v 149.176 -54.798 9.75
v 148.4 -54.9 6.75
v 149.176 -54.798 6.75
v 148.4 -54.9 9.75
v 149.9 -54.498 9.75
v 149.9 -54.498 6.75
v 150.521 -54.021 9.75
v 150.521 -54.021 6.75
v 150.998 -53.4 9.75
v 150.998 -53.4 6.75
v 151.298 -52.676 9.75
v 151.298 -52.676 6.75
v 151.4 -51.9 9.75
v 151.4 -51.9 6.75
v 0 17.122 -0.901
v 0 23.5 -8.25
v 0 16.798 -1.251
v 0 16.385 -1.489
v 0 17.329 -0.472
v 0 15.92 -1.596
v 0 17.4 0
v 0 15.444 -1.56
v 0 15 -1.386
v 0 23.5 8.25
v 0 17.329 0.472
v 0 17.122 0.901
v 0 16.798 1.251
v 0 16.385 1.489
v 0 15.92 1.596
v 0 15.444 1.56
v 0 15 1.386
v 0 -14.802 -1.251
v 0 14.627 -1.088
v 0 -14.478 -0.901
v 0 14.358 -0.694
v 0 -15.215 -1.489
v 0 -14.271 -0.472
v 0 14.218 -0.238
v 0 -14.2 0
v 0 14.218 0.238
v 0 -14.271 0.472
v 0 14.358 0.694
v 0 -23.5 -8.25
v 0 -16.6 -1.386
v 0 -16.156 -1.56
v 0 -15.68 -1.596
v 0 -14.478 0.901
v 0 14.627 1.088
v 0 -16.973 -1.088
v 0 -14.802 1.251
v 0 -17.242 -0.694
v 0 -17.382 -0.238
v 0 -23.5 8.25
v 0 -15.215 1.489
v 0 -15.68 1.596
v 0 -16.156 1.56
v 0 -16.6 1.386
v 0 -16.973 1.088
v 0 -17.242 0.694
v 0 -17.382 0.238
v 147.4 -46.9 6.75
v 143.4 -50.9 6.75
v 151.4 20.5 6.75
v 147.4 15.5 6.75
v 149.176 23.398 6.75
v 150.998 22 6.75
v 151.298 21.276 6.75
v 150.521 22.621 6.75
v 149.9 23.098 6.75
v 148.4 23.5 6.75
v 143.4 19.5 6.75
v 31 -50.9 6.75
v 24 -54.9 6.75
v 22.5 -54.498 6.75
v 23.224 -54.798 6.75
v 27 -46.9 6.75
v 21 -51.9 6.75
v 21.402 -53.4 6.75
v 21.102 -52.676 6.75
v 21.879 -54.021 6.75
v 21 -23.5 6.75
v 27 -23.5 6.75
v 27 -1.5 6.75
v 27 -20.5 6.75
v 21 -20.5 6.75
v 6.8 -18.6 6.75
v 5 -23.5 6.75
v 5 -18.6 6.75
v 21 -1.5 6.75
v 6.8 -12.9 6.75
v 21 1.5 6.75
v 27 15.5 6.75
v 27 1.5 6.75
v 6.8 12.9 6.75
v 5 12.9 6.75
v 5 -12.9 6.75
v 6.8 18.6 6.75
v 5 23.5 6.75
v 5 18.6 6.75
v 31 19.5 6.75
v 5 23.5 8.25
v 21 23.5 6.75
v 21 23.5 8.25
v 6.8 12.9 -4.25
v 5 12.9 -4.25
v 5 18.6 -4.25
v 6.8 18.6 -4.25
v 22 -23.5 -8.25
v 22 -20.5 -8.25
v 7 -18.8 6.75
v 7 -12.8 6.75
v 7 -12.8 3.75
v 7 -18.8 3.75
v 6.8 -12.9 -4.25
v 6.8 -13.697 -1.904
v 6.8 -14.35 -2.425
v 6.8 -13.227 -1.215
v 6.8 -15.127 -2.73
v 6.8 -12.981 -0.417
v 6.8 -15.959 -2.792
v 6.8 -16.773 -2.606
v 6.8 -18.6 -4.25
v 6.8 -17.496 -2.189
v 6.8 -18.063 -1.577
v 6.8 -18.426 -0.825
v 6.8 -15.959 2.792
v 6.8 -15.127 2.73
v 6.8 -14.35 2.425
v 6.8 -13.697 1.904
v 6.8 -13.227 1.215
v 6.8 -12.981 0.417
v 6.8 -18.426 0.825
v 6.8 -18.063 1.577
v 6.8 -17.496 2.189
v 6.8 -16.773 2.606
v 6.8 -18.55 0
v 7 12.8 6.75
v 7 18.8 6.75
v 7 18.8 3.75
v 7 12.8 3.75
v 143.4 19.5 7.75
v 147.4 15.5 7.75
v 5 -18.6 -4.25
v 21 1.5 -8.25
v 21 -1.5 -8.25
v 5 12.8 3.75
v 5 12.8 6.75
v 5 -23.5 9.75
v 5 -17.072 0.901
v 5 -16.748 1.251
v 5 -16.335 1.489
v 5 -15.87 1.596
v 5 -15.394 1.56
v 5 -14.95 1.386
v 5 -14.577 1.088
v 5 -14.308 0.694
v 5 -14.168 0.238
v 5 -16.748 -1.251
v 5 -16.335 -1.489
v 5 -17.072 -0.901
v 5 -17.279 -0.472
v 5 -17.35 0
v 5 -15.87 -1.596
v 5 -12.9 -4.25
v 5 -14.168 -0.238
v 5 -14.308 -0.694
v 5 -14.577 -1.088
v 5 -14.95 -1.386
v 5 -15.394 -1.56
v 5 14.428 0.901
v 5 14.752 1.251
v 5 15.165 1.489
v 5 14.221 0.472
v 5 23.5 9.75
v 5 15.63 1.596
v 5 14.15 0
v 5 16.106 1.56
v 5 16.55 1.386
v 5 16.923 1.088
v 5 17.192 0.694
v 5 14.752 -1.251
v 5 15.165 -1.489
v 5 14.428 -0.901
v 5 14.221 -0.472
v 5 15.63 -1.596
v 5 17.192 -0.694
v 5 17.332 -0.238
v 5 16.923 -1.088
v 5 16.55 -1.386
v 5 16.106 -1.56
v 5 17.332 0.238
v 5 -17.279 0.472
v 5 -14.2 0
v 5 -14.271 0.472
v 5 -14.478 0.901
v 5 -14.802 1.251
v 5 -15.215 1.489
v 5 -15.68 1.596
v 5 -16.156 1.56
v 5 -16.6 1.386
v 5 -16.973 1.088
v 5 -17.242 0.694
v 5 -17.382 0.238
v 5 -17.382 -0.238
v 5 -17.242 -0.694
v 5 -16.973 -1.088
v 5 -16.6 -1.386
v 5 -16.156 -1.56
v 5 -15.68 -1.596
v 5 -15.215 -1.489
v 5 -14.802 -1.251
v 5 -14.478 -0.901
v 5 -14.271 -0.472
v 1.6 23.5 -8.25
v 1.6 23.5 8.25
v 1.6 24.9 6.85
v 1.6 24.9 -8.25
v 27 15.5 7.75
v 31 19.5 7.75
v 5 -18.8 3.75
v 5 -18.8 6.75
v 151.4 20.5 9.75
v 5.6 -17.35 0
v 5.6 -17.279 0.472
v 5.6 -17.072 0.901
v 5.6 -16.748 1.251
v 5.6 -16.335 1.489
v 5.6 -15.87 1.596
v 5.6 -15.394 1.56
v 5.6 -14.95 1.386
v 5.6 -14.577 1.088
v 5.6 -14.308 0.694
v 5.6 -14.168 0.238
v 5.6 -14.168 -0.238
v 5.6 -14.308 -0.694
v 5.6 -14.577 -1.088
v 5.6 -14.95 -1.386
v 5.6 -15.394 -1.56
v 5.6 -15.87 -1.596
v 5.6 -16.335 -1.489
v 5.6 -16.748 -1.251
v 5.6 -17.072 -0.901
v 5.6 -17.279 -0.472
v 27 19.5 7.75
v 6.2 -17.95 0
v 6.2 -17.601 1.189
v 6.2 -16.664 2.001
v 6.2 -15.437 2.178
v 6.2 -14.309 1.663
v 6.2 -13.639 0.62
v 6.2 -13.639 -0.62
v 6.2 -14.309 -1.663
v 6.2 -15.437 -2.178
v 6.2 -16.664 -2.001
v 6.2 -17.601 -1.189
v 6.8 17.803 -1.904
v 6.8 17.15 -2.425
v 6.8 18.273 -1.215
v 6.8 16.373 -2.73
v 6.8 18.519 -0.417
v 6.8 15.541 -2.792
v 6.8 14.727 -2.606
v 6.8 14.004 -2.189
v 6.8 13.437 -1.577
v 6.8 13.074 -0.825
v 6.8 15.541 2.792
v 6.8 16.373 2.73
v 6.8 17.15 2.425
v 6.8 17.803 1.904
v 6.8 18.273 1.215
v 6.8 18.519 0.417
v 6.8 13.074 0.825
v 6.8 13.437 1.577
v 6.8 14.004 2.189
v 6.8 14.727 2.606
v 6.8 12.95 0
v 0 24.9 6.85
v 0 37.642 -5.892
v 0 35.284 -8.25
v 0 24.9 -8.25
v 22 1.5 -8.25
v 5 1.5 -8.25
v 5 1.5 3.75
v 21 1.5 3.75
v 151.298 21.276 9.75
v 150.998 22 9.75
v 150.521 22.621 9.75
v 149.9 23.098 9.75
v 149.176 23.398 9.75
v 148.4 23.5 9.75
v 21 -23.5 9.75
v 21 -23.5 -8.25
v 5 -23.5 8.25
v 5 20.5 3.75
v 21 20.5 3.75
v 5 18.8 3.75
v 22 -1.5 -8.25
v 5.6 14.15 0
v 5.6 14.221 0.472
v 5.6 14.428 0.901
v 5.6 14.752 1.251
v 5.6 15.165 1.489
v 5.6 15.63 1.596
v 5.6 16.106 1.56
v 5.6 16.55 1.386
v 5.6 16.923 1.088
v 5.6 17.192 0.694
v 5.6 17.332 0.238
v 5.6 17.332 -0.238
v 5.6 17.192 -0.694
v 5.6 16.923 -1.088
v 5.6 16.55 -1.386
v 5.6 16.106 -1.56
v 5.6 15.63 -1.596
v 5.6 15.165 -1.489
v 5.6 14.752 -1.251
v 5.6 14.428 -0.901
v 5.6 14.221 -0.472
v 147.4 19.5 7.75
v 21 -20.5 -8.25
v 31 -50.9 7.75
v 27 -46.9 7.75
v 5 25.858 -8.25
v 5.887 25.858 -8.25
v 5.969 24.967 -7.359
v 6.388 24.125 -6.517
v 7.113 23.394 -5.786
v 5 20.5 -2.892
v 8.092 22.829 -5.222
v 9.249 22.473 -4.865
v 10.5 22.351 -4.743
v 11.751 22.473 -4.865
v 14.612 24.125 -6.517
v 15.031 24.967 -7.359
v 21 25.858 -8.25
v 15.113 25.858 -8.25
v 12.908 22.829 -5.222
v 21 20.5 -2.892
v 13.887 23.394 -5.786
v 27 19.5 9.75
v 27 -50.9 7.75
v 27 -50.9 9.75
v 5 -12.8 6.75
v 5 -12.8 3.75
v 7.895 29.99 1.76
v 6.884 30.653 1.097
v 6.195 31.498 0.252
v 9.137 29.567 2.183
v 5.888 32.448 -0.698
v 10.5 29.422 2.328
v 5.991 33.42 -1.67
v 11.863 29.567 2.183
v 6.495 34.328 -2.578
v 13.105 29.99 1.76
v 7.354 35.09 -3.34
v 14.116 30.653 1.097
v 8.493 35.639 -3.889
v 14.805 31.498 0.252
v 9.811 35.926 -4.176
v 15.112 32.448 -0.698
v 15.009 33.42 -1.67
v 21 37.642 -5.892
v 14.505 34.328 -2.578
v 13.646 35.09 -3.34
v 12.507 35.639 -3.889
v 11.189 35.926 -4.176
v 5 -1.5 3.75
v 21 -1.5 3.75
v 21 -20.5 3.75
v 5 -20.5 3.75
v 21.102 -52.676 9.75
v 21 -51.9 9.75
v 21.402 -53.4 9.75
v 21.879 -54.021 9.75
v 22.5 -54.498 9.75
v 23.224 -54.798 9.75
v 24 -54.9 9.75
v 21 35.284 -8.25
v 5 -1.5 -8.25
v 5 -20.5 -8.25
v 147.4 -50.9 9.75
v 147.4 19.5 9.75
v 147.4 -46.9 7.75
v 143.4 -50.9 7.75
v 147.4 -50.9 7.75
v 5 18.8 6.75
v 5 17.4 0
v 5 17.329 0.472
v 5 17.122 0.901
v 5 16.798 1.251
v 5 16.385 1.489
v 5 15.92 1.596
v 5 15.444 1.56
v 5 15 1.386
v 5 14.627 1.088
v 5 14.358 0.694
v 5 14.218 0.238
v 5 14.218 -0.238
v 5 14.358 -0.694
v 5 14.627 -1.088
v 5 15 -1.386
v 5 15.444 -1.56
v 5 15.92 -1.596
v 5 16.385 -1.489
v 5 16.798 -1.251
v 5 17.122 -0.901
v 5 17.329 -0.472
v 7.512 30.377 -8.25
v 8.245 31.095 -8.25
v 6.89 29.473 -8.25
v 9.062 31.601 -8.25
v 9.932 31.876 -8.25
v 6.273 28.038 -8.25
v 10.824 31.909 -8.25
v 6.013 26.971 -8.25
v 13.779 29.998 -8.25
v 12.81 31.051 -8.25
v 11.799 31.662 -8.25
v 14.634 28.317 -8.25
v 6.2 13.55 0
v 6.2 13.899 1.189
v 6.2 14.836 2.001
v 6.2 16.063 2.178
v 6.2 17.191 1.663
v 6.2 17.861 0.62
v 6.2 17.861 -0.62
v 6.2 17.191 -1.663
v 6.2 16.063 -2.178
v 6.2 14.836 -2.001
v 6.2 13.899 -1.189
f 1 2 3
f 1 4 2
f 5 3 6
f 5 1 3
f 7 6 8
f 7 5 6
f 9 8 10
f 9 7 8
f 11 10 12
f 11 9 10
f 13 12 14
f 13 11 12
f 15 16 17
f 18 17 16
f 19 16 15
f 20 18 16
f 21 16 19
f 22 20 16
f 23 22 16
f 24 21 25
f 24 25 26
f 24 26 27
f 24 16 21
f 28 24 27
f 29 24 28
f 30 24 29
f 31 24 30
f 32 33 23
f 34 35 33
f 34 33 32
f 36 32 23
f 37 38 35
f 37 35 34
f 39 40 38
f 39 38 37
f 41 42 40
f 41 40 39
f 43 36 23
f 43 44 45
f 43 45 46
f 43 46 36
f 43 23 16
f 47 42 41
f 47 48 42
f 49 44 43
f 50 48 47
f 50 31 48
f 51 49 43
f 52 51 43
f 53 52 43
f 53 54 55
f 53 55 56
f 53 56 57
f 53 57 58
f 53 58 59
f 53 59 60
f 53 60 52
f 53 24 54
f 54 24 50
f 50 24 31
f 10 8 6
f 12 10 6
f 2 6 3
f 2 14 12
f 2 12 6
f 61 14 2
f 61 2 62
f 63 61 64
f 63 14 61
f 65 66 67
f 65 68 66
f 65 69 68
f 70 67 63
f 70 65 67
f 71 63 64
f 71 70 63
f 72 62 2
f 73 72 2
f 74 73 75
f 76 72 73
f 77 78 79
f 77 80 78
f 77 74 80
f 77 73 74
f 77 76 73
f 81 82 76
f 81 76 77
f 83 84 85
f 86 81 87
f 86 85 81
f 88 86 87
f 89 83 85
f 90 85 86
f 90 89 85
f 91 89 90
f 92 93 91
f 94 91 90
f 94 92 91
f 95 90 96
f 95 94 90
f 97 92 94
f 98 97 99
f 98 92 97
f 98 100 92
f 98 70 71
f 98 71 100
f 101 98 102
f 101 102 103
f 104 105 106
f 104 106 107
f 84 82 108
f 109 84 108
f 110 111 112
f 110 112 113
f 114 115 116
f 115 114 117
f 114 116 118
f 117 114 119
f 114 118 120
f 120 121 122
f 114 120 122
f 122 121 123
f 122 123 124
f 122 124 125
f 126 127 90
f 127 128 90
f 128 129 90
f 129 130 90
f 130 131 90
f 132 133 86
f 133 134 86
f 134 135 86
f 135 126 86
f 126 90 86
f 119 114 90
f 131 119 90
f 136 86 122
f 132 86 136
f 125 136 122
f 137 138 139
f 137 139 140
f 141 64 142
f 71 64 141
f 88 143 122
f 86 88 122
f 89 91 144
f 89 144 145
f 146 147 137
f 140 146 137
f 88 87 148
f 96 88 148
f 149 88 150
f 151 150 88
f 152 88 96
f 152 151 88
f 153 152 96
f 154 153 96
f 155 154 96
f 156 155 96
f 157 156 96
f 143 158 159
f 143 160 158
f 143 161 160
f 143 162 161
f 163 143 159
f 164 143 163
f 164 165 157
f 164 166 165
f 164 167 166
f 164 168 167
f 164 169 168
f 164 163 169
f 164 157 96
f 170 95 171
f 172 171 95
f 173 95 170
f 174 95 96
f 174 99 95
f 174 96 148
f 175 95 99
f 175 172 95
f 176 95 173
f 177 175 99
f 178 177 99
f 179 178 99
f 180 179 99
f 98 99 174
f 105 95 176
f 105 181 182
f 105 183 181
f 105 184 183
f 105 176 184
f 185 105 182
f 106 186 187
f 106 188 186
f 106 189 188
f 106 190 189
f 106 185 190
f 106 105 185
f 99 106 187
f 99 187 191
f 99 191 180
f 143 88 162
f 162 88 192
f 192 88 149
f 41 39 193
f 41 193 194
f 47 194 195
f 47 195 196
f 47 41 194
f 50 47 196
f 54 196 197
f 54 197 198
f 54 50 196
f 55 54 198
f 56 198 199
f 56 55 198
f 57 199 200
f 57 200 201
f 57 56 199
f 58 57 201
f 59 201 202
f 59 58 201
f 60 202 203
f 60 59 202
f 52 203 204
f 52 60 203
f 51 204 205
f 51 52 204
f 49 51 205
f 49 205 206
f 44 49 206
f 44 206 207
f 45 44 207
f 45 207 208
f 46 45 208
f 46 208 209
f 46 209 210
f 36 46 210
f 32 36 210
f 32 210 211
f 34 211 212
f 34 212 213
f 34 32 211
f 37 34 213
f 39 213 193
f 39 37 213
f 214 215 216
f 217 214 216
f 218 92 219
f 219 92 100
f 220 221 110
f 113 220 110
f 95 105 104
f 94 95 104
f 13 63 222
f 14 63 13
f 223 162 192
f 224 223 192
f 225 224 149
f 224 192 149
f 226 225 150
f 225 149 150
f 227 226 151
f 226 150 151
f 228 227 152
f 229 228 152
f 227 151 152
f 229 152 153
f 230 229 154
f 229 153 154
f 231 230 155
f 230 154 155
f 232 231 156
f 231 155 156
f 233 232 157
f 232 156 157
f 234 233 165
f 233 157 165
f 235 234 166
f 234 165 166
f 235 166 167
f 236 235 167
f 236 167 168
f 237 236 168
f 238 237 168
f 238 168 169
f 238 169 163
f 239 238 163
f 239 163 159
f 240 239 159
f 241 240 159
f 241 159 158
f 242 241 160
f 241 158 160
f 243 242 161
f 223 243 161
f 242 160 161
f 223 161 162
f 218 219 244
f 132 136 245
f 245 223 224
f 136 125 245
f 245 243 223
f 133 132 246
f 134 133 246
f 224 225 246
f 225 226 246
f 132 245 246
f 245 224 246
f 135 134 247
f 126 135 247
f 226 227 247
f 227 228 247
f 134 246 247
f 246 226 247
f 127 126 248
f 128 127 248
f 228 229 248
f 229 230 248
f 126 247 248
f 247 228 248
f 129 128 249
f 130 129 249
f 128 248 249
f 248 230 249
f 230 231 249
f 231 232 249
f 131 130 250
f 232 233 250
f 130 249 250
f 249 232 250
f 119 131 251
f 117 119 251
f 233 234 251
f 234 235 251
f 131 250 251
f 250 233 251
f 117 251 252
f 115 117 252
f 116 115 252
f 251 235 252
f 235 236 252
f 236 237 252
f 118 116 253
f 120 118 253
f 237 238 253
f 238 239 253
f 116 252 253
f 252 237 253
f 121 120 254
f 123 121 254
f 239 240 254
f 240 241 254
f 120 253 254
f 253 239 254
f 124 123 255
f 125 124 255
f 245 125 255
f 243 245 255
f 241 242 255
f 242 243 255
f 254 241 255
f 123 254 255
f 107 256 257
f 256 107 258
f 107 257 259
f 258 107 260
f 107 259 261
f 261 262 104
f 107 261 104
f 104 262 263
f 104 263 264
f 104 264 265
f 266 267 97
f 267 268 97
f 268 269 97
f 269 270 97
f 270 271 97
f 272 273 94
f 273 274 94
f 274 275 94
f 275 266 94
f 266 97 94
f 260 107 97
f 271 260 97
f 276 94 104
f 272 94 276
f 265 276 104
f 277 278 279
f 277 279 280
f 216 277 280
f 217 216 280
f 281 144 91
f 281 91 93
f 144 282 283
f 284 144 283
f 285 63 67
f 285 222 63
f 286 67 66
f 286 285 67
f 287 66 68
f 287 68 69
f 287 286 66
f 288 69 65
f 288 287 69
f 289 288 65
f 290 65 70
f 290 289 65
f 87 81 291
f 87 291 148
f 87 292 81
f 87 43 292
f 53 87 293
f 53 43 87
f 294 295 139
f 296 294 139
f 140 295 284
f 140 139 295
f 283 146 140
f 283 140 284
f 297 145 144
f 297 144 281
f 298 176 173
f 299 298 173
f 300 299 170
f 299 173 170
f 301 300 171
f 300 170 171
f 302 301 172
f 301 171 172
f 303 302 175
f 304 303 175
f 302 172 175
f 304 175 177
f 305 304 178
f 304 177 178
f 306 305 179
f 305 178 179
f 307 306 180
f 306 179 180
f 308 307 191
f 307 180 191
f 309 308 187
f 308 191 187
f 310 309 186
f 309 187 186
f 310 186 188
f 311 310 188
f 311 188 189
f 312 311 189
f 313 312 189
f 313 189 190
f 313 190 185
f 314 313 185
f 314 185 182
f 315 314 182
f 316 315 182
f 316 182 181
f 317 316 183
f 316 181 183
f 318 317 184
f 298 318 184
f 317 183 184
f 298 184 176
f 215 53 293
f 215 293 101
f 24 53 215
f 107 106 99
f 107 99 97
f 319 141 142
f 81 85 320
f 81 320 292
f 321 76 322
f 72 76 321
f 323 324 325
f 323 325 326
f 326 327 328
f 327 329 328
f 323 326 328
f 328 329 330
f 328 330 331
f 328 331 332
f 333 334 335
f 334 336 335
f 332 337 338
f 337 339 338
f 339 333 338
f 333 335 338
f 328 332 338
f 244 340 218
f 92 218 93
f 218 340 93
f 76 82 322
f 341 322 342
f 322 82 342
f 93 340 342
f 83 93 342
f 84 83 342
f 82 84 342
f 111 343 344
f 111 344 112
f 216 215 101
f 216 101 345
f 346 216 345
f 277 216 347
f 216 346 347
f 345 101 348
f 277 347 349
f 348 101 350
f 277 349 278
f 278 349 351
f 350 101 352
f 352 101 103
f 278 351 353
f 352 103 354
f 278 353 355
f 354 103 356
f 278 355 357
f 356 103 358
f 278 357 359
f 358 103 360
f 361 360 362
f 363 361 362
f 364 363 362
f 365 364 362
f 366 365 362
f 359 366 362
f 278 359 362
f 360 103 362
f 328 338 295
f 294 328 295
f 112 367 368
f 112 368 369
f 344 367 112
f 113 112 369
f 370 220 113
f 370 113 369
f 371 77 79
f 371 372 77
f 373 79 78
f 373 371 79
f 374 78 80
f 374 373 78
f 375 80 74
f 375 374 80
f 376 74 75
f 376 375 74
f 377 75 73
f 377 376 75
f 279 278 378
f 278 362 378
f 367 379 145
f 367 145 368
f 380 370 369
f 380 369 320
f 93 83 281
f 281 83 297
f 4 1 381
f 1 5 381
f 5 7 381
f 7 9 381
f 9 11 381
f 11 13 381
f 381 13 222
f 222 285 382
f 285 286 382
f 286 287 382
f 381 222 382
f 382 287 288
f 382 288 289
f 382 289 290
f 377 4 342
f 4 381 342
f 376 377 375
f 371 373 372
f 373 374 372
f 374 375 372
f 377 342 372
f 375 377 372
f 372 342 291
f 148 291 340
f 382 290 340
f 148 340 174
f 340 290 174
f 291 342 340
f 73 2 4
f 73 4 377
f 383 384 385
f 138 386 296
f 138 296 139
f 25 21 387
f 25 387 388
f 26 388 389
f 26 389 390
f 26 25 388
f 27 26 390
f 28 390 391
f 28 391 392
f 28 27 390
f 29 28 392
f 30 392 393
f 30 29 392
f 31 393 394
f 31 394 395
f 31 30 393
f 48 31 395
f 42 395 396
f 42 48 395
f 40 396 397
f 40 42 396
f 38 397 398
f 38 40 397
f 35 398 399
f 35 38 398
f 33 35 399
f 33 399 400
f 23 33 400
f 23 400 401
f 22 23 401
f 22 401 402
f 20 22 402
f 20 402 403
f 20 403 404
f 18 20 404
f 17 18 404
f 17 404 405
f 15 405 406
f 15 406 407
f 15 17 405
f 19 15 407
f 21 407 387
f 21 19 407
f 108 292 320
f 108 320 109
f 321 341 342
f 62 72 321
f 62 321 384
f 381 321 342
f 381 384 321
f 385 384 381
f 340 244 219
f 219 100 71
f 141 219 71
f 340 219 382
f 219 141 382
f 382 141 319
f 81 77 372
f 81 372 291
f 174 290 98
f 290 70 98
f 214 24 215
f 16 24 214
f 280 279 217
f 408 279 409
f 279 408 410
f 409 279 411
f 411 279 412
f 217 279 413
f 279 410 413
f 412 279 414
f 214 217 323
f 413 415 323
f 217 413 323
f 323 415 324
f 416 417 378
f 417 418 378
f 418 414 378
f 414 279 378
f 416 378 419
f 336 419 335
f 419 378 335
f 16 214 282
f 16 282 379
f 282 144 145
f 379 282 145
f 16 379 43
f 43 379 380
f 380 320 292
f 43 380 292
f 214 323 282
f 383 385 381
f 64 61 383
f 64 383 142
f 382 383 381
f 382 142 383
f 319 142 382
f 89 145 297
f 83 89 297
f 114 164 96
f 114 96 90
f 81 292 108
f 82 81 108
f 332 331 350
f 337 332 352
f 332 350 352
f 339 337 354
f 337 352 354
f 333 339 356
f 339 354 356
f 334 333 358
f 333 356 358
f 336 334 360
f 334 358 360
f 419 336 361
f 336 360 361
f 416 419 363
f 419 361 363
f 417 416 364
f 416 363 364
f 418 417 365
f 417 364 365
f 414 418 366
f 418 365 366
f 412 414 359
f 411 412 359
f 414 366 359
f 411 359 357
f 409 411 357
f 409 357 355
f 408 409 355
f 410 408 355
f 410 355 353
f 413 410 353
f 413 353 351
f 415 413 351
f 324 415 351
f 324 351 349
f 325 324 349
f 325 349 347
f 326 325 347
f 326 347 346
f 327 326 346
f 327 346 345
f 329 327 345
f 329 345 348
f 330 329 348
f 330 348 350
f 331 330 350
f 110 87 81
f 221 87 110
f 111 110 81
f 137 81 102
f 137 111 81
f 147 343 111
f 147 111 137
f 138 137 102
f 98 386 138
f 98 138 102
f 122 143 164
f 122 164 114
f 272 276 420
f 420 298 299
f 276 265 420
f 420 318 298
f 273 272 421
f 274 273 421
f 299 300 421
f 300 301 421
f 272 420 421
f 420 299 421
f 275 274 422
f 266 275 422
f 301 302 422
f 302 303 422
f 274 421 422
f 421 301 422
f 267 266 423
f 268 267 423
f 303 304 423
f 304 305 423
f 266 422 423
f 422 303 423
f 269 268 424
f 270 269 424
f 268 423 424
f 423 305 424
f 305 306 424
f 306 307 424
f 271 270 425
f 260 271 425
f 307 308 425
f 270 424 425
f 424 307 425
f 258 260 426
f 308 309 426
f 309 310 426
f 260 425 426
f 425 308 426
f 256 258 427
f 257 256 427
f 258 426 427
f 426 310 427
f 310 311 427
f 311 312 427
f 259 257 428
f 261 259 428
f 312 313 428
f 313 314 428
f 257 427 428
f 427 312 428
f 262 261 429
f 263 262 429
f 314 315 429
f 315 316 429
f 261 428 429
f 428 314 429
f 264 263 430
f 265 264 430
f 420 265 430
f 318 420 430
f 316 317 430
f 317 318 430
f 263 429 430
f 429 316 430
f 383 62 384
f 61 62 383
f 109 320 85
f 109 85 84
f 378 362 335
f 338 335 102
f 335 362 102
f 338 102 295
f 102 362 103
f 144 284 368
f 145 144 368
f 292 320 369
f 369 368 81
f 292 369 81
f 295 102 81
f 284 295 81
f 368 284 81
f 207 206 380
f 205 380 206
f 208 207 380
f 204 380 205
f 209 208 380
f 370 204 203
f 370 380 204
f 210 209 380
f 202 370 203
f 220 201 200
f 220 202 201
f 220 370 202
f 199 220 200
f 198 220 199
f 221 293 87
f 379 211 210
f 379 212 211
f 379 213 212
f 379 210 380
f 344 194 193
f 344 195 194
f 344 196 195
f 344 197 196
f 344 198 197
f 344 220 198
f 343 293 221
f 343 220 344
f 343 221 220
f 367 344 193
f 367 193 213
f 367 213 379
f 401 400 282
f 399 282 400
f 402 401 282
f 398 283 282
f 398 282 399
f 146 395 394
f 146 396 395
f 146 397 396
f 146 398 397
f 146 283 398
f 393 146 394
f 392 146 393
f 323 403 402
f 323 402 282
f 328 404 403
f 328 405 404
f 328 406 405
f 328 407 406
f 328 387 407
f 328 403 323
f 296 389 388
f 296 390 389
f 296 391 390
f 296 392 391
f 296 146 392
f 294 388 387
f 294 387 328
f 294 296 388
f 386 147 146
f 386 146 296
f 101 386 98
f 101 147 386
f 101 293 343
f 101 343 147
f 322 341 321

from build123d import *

# Parameters (mm, degrees)
SKETCH_W          = 47
SKETCH_H          = 16.5
SKETCH_R          = 1.6
PAD_DEPTH         = 5
PAD001_DEPTH      = 16
SKETCH002_W       = 6
SKETCH002_H       = 2
POCKET_DEPTH      = 3
PAD002_DEPTH      = 16
PAD002_DEPTH_BACK = 5
SKETCH004_R       = 4.625
POCKET001_DEPTH   = 44.902281
POCKET002_DEPTH   = 16
SKETCH006_W       = 3
SKETCH006_H       = 12
PAD003_DEPTH      = 16
SKETCH008_W       = 1.4
SKETCH008_H       = 16.5
POCKET003_DEPTH   = 1.6
SKETCH007_W       = 120.4
SKETCH007_H       = 70.4
PAD004_DEPTH      = 3
SKETCH009_W       = 6
SKETCH009_H       = 3
PAD005_DEPTH      = 15
POCKET004_DEPTH   = 47.001
PAD006_DEPTH      = 1
SKETCH012_W       = 1.8
SKETCH012_H       = 5.7
PAD007_DEPTH      = 11
SKETCH013_R       = 1.6
POCKET005_DEPTH   = 1.8
FILLET_R          = 3
CHAMFER_SIZE      = 1.2


with BuildPart() as lens_and_arm_mount:
    # Sketch → Pad (new body)
    with BuildSketch(Plane.YZ):
        Rectangle(SKETCH_W, SKETCH_H)
        with Locations((-15.8, 0)):
            Circle(SKETCH_R, mode=Mode.SUBTRACT)
        with Locations((15.8, 0)):
            Circle(SKETCH_R, mode=Mode.SUBTRACT)
    extrude(amount=PAD_DEPTH)

    # Sketch001 (on Face8 of Pad) → Pad001 (join)
    with BuildSketch(Plane.YZ.offset(5)):
        Polygon((-23.5, -8.25), (-23.5, 6.75), (23.5, 6.75), (23.5, -8.25), (20.5, -8.25), (20.5, 3.75), (-20.5, 3.75), (-20.5, -8.25), align=None)
    extrude(amount=PAD001_DEPTH)

    # Sketch002 (on Face11 of Pad001) → Pocket (cut)
    with BuildSketch(Plane(origin=(0, 0, 6.75), x_dir=(0, -1, 0), z_dir=(0, 0, 1))):
        with Locations((-15.8, 6)):
            Rectangle(SKETCH002_W, SKETCH002_H)
        with Locations((15.8, 6)):
            Rectangle(SKETCH002_W, SKETCH002_H)
    extrude(amount=-POCKET_DEPTH, mode=Mode.SUBTRACT)

    # Sketch003 (on Face8 of Pad) → Pad002 (join, two sides)
    with BuildSketch(Plane.YZ.offset(5)) as pad002_sk:
        Polygon((23.5, 8.25), (37.642136, -5.892136), (35.284271, -8.25), (23.5, -8.25), align=None)
    extrude(amount=PAD002_DEPTH)
    extrude(pad002_sk.sketch, amount=-PAD002_DEPTH_BACK)

    # Sketch004 (on Face3 of Pad002) → Pocket001 (cut, through all)
    with BuildSketch(Plane(origin=(0, 15.875, 15.875), x_dir=(0, -0.707107, 0.707107), z_dir=(0, 0.707107, 0.707107))):
        with Locations((-23.783378, 10.5)):
            Circle(SKETCH004_R)
    extrude(amount=-POCKET001_DEPTH, mode=Mode.SUBTRACT)

    # Sketch005 (on Face11 of Pocket001) → Pocket002 (cut)
    with BuildSketch(Plane.YZ.offset(21)):
        Polygon((30.571068, -12.963203), (18.550253, -0.942388), (15.014719, -4.477922), (27.035534, -16.498737), align=None)
    extrude(amount=-POCKET002_DEPTH, mode=Mode.SUBTRACT)

    # Sketch006 (on Face15 of Pocket) → Pad003 (join)
    with BuildSketch(Plane.YZ.offset(5)):
        with Locations((0, -2.25)):
            Rectangle(SKETCH006_W, SKETCH006_H)
    extrude(amount=PAD003_DEPTH)

    # Sketch008 (on Face4 of Pocket001) → Pocket003 (cut)
    with BuildSketch(Plane(origin=(0, 0, 0), x_dir=(0, 1, 0), z_dir=(-1, 0, 0))):
        with Locations((24.2, 0)):
            Rectangle(SKETCH008_W, SKETCH008_H)
    extrude(amount=-POCKET003_DEPTH, mode=Mode.SUBTRACT)


with BuildPart() as maginifier_holder:
    # Sketch007 → Pad004 (new body)
    with BuildSketch(Plane.XY.offset(6.75)):
        Polygon((5, 23.5), (21, 23.5), (151.4, 23.5), (151.4, -54.9), (21, -54.9), (21, -23.5), (5, -23.5), align=None)
        with Locations((87.2, -15.7)):
            Rectangle(SKETCH007_W, SKETCH007_H, mode=Mode.SUBTRACT)
    extrude(amount=PAD004_DEPTH)

    # Sketch009 (on Face12 of Pad004) → Pad005 (join)
    with BuildSketch(Plane(origin=(0, 0, 6.75), x_dir=(1, 0, 0), z_dir=(0, 0, -1))):
        with Locations((24, 0)):
            Rectangle(SKETCH009_W, SKETCH009_H)
        with Locations((24, 22)):
            Rectangle(SKETCH009_W, SKETCH009_H)
    extrude(amount=PAD005_DEPTH)

    # Sketch010 (on Face10 of Pad005) → Pocket004 (cut, through all)
    with BuildSketch(Plane.XZ.offset(23.5)):
        Polygon((27, 6.75), (22, -8.25), (27, -8.25), align=None)
    extrude(amount=-POCKET004_DEPTH, mode=Mode.SUBTRACT)

    # Sketch011 (on Face22 of Pocket004) → Pad006 (join)
    with BuildSketch(Plane(origin=(0, 0, 6.75), x_dir=(1, 0, 0), z_dir=(0, 0, -1))):
        Polygon((25, 52.9), (25, 44.9), (33, 52.9), align=None)
        Polygon((25, -21.5), (25, -13.5), (33, -21.5), align=None)
        Polygon((149.4, -21.5), (149.4, -13.5), (141.4, -21.5), align=None)
        Polygon((149.4, 52.9), (141.4, 52.9), (149.4, 44.9), align=None)
    extrude(amount=-PAD006_DEPTH)

    # Sketch012 (on Face2 of Pad006) → Pad007 (join)
    with BuildSketch(Plane(origin=(0, 0, 6.75), x_dir=(1, 0, 0), z_dir=(0, 0, -1))):
        with Locations((5.9, 15.75)):
            Rectangle(SKETCH012_W, SKETCH012_H)
        with Locations((5.9, -15.75)):
            Rectangle(SKETCH012_W, SKETCH012_H)
    extrude(amount=PAD007_DEPTH)

    # Sketch013 (on Face32 of Pad007) → Pocket005 (cut)
    with BuildSketch(Plane(origin=(5, 0, 0), x_dir=(0, -1, 0), z_dir=(-1, 0, 0))):
        with Locations((-15.75, 0)):
            Circle(SKETCH013_R)
        with Locations((15.75, 0)):
            Circle(SKETCH013_R)
    extrude(amount=-POCKET005_DEPTH, mode=Mode.SUBTRACT)

    # Fillet
    fillet_edges = [maginifier_holder.edges().sort_by_distance(p)[0] for p in [
        (21, -54.9, 8.25),
        (151.4, -54.9, 8.25),
        (151.4, 23.5, 8.25),
    ]]
    fillet(fillet_edges, radius=FILLET_R)

    # Chamfer
    chamfer_edges = [maginifier_holder.edges().sort_by_distance(p)[0] for p in [
        (6.8, 17.35, 0),
        (6.8, -14.15, 0),
    ]]
    chamfer(chamfer_edges, length=CHAMFER_SIZE)


solid = Compound([lens_and_arm_mount.part, maginifier_holder.part])
